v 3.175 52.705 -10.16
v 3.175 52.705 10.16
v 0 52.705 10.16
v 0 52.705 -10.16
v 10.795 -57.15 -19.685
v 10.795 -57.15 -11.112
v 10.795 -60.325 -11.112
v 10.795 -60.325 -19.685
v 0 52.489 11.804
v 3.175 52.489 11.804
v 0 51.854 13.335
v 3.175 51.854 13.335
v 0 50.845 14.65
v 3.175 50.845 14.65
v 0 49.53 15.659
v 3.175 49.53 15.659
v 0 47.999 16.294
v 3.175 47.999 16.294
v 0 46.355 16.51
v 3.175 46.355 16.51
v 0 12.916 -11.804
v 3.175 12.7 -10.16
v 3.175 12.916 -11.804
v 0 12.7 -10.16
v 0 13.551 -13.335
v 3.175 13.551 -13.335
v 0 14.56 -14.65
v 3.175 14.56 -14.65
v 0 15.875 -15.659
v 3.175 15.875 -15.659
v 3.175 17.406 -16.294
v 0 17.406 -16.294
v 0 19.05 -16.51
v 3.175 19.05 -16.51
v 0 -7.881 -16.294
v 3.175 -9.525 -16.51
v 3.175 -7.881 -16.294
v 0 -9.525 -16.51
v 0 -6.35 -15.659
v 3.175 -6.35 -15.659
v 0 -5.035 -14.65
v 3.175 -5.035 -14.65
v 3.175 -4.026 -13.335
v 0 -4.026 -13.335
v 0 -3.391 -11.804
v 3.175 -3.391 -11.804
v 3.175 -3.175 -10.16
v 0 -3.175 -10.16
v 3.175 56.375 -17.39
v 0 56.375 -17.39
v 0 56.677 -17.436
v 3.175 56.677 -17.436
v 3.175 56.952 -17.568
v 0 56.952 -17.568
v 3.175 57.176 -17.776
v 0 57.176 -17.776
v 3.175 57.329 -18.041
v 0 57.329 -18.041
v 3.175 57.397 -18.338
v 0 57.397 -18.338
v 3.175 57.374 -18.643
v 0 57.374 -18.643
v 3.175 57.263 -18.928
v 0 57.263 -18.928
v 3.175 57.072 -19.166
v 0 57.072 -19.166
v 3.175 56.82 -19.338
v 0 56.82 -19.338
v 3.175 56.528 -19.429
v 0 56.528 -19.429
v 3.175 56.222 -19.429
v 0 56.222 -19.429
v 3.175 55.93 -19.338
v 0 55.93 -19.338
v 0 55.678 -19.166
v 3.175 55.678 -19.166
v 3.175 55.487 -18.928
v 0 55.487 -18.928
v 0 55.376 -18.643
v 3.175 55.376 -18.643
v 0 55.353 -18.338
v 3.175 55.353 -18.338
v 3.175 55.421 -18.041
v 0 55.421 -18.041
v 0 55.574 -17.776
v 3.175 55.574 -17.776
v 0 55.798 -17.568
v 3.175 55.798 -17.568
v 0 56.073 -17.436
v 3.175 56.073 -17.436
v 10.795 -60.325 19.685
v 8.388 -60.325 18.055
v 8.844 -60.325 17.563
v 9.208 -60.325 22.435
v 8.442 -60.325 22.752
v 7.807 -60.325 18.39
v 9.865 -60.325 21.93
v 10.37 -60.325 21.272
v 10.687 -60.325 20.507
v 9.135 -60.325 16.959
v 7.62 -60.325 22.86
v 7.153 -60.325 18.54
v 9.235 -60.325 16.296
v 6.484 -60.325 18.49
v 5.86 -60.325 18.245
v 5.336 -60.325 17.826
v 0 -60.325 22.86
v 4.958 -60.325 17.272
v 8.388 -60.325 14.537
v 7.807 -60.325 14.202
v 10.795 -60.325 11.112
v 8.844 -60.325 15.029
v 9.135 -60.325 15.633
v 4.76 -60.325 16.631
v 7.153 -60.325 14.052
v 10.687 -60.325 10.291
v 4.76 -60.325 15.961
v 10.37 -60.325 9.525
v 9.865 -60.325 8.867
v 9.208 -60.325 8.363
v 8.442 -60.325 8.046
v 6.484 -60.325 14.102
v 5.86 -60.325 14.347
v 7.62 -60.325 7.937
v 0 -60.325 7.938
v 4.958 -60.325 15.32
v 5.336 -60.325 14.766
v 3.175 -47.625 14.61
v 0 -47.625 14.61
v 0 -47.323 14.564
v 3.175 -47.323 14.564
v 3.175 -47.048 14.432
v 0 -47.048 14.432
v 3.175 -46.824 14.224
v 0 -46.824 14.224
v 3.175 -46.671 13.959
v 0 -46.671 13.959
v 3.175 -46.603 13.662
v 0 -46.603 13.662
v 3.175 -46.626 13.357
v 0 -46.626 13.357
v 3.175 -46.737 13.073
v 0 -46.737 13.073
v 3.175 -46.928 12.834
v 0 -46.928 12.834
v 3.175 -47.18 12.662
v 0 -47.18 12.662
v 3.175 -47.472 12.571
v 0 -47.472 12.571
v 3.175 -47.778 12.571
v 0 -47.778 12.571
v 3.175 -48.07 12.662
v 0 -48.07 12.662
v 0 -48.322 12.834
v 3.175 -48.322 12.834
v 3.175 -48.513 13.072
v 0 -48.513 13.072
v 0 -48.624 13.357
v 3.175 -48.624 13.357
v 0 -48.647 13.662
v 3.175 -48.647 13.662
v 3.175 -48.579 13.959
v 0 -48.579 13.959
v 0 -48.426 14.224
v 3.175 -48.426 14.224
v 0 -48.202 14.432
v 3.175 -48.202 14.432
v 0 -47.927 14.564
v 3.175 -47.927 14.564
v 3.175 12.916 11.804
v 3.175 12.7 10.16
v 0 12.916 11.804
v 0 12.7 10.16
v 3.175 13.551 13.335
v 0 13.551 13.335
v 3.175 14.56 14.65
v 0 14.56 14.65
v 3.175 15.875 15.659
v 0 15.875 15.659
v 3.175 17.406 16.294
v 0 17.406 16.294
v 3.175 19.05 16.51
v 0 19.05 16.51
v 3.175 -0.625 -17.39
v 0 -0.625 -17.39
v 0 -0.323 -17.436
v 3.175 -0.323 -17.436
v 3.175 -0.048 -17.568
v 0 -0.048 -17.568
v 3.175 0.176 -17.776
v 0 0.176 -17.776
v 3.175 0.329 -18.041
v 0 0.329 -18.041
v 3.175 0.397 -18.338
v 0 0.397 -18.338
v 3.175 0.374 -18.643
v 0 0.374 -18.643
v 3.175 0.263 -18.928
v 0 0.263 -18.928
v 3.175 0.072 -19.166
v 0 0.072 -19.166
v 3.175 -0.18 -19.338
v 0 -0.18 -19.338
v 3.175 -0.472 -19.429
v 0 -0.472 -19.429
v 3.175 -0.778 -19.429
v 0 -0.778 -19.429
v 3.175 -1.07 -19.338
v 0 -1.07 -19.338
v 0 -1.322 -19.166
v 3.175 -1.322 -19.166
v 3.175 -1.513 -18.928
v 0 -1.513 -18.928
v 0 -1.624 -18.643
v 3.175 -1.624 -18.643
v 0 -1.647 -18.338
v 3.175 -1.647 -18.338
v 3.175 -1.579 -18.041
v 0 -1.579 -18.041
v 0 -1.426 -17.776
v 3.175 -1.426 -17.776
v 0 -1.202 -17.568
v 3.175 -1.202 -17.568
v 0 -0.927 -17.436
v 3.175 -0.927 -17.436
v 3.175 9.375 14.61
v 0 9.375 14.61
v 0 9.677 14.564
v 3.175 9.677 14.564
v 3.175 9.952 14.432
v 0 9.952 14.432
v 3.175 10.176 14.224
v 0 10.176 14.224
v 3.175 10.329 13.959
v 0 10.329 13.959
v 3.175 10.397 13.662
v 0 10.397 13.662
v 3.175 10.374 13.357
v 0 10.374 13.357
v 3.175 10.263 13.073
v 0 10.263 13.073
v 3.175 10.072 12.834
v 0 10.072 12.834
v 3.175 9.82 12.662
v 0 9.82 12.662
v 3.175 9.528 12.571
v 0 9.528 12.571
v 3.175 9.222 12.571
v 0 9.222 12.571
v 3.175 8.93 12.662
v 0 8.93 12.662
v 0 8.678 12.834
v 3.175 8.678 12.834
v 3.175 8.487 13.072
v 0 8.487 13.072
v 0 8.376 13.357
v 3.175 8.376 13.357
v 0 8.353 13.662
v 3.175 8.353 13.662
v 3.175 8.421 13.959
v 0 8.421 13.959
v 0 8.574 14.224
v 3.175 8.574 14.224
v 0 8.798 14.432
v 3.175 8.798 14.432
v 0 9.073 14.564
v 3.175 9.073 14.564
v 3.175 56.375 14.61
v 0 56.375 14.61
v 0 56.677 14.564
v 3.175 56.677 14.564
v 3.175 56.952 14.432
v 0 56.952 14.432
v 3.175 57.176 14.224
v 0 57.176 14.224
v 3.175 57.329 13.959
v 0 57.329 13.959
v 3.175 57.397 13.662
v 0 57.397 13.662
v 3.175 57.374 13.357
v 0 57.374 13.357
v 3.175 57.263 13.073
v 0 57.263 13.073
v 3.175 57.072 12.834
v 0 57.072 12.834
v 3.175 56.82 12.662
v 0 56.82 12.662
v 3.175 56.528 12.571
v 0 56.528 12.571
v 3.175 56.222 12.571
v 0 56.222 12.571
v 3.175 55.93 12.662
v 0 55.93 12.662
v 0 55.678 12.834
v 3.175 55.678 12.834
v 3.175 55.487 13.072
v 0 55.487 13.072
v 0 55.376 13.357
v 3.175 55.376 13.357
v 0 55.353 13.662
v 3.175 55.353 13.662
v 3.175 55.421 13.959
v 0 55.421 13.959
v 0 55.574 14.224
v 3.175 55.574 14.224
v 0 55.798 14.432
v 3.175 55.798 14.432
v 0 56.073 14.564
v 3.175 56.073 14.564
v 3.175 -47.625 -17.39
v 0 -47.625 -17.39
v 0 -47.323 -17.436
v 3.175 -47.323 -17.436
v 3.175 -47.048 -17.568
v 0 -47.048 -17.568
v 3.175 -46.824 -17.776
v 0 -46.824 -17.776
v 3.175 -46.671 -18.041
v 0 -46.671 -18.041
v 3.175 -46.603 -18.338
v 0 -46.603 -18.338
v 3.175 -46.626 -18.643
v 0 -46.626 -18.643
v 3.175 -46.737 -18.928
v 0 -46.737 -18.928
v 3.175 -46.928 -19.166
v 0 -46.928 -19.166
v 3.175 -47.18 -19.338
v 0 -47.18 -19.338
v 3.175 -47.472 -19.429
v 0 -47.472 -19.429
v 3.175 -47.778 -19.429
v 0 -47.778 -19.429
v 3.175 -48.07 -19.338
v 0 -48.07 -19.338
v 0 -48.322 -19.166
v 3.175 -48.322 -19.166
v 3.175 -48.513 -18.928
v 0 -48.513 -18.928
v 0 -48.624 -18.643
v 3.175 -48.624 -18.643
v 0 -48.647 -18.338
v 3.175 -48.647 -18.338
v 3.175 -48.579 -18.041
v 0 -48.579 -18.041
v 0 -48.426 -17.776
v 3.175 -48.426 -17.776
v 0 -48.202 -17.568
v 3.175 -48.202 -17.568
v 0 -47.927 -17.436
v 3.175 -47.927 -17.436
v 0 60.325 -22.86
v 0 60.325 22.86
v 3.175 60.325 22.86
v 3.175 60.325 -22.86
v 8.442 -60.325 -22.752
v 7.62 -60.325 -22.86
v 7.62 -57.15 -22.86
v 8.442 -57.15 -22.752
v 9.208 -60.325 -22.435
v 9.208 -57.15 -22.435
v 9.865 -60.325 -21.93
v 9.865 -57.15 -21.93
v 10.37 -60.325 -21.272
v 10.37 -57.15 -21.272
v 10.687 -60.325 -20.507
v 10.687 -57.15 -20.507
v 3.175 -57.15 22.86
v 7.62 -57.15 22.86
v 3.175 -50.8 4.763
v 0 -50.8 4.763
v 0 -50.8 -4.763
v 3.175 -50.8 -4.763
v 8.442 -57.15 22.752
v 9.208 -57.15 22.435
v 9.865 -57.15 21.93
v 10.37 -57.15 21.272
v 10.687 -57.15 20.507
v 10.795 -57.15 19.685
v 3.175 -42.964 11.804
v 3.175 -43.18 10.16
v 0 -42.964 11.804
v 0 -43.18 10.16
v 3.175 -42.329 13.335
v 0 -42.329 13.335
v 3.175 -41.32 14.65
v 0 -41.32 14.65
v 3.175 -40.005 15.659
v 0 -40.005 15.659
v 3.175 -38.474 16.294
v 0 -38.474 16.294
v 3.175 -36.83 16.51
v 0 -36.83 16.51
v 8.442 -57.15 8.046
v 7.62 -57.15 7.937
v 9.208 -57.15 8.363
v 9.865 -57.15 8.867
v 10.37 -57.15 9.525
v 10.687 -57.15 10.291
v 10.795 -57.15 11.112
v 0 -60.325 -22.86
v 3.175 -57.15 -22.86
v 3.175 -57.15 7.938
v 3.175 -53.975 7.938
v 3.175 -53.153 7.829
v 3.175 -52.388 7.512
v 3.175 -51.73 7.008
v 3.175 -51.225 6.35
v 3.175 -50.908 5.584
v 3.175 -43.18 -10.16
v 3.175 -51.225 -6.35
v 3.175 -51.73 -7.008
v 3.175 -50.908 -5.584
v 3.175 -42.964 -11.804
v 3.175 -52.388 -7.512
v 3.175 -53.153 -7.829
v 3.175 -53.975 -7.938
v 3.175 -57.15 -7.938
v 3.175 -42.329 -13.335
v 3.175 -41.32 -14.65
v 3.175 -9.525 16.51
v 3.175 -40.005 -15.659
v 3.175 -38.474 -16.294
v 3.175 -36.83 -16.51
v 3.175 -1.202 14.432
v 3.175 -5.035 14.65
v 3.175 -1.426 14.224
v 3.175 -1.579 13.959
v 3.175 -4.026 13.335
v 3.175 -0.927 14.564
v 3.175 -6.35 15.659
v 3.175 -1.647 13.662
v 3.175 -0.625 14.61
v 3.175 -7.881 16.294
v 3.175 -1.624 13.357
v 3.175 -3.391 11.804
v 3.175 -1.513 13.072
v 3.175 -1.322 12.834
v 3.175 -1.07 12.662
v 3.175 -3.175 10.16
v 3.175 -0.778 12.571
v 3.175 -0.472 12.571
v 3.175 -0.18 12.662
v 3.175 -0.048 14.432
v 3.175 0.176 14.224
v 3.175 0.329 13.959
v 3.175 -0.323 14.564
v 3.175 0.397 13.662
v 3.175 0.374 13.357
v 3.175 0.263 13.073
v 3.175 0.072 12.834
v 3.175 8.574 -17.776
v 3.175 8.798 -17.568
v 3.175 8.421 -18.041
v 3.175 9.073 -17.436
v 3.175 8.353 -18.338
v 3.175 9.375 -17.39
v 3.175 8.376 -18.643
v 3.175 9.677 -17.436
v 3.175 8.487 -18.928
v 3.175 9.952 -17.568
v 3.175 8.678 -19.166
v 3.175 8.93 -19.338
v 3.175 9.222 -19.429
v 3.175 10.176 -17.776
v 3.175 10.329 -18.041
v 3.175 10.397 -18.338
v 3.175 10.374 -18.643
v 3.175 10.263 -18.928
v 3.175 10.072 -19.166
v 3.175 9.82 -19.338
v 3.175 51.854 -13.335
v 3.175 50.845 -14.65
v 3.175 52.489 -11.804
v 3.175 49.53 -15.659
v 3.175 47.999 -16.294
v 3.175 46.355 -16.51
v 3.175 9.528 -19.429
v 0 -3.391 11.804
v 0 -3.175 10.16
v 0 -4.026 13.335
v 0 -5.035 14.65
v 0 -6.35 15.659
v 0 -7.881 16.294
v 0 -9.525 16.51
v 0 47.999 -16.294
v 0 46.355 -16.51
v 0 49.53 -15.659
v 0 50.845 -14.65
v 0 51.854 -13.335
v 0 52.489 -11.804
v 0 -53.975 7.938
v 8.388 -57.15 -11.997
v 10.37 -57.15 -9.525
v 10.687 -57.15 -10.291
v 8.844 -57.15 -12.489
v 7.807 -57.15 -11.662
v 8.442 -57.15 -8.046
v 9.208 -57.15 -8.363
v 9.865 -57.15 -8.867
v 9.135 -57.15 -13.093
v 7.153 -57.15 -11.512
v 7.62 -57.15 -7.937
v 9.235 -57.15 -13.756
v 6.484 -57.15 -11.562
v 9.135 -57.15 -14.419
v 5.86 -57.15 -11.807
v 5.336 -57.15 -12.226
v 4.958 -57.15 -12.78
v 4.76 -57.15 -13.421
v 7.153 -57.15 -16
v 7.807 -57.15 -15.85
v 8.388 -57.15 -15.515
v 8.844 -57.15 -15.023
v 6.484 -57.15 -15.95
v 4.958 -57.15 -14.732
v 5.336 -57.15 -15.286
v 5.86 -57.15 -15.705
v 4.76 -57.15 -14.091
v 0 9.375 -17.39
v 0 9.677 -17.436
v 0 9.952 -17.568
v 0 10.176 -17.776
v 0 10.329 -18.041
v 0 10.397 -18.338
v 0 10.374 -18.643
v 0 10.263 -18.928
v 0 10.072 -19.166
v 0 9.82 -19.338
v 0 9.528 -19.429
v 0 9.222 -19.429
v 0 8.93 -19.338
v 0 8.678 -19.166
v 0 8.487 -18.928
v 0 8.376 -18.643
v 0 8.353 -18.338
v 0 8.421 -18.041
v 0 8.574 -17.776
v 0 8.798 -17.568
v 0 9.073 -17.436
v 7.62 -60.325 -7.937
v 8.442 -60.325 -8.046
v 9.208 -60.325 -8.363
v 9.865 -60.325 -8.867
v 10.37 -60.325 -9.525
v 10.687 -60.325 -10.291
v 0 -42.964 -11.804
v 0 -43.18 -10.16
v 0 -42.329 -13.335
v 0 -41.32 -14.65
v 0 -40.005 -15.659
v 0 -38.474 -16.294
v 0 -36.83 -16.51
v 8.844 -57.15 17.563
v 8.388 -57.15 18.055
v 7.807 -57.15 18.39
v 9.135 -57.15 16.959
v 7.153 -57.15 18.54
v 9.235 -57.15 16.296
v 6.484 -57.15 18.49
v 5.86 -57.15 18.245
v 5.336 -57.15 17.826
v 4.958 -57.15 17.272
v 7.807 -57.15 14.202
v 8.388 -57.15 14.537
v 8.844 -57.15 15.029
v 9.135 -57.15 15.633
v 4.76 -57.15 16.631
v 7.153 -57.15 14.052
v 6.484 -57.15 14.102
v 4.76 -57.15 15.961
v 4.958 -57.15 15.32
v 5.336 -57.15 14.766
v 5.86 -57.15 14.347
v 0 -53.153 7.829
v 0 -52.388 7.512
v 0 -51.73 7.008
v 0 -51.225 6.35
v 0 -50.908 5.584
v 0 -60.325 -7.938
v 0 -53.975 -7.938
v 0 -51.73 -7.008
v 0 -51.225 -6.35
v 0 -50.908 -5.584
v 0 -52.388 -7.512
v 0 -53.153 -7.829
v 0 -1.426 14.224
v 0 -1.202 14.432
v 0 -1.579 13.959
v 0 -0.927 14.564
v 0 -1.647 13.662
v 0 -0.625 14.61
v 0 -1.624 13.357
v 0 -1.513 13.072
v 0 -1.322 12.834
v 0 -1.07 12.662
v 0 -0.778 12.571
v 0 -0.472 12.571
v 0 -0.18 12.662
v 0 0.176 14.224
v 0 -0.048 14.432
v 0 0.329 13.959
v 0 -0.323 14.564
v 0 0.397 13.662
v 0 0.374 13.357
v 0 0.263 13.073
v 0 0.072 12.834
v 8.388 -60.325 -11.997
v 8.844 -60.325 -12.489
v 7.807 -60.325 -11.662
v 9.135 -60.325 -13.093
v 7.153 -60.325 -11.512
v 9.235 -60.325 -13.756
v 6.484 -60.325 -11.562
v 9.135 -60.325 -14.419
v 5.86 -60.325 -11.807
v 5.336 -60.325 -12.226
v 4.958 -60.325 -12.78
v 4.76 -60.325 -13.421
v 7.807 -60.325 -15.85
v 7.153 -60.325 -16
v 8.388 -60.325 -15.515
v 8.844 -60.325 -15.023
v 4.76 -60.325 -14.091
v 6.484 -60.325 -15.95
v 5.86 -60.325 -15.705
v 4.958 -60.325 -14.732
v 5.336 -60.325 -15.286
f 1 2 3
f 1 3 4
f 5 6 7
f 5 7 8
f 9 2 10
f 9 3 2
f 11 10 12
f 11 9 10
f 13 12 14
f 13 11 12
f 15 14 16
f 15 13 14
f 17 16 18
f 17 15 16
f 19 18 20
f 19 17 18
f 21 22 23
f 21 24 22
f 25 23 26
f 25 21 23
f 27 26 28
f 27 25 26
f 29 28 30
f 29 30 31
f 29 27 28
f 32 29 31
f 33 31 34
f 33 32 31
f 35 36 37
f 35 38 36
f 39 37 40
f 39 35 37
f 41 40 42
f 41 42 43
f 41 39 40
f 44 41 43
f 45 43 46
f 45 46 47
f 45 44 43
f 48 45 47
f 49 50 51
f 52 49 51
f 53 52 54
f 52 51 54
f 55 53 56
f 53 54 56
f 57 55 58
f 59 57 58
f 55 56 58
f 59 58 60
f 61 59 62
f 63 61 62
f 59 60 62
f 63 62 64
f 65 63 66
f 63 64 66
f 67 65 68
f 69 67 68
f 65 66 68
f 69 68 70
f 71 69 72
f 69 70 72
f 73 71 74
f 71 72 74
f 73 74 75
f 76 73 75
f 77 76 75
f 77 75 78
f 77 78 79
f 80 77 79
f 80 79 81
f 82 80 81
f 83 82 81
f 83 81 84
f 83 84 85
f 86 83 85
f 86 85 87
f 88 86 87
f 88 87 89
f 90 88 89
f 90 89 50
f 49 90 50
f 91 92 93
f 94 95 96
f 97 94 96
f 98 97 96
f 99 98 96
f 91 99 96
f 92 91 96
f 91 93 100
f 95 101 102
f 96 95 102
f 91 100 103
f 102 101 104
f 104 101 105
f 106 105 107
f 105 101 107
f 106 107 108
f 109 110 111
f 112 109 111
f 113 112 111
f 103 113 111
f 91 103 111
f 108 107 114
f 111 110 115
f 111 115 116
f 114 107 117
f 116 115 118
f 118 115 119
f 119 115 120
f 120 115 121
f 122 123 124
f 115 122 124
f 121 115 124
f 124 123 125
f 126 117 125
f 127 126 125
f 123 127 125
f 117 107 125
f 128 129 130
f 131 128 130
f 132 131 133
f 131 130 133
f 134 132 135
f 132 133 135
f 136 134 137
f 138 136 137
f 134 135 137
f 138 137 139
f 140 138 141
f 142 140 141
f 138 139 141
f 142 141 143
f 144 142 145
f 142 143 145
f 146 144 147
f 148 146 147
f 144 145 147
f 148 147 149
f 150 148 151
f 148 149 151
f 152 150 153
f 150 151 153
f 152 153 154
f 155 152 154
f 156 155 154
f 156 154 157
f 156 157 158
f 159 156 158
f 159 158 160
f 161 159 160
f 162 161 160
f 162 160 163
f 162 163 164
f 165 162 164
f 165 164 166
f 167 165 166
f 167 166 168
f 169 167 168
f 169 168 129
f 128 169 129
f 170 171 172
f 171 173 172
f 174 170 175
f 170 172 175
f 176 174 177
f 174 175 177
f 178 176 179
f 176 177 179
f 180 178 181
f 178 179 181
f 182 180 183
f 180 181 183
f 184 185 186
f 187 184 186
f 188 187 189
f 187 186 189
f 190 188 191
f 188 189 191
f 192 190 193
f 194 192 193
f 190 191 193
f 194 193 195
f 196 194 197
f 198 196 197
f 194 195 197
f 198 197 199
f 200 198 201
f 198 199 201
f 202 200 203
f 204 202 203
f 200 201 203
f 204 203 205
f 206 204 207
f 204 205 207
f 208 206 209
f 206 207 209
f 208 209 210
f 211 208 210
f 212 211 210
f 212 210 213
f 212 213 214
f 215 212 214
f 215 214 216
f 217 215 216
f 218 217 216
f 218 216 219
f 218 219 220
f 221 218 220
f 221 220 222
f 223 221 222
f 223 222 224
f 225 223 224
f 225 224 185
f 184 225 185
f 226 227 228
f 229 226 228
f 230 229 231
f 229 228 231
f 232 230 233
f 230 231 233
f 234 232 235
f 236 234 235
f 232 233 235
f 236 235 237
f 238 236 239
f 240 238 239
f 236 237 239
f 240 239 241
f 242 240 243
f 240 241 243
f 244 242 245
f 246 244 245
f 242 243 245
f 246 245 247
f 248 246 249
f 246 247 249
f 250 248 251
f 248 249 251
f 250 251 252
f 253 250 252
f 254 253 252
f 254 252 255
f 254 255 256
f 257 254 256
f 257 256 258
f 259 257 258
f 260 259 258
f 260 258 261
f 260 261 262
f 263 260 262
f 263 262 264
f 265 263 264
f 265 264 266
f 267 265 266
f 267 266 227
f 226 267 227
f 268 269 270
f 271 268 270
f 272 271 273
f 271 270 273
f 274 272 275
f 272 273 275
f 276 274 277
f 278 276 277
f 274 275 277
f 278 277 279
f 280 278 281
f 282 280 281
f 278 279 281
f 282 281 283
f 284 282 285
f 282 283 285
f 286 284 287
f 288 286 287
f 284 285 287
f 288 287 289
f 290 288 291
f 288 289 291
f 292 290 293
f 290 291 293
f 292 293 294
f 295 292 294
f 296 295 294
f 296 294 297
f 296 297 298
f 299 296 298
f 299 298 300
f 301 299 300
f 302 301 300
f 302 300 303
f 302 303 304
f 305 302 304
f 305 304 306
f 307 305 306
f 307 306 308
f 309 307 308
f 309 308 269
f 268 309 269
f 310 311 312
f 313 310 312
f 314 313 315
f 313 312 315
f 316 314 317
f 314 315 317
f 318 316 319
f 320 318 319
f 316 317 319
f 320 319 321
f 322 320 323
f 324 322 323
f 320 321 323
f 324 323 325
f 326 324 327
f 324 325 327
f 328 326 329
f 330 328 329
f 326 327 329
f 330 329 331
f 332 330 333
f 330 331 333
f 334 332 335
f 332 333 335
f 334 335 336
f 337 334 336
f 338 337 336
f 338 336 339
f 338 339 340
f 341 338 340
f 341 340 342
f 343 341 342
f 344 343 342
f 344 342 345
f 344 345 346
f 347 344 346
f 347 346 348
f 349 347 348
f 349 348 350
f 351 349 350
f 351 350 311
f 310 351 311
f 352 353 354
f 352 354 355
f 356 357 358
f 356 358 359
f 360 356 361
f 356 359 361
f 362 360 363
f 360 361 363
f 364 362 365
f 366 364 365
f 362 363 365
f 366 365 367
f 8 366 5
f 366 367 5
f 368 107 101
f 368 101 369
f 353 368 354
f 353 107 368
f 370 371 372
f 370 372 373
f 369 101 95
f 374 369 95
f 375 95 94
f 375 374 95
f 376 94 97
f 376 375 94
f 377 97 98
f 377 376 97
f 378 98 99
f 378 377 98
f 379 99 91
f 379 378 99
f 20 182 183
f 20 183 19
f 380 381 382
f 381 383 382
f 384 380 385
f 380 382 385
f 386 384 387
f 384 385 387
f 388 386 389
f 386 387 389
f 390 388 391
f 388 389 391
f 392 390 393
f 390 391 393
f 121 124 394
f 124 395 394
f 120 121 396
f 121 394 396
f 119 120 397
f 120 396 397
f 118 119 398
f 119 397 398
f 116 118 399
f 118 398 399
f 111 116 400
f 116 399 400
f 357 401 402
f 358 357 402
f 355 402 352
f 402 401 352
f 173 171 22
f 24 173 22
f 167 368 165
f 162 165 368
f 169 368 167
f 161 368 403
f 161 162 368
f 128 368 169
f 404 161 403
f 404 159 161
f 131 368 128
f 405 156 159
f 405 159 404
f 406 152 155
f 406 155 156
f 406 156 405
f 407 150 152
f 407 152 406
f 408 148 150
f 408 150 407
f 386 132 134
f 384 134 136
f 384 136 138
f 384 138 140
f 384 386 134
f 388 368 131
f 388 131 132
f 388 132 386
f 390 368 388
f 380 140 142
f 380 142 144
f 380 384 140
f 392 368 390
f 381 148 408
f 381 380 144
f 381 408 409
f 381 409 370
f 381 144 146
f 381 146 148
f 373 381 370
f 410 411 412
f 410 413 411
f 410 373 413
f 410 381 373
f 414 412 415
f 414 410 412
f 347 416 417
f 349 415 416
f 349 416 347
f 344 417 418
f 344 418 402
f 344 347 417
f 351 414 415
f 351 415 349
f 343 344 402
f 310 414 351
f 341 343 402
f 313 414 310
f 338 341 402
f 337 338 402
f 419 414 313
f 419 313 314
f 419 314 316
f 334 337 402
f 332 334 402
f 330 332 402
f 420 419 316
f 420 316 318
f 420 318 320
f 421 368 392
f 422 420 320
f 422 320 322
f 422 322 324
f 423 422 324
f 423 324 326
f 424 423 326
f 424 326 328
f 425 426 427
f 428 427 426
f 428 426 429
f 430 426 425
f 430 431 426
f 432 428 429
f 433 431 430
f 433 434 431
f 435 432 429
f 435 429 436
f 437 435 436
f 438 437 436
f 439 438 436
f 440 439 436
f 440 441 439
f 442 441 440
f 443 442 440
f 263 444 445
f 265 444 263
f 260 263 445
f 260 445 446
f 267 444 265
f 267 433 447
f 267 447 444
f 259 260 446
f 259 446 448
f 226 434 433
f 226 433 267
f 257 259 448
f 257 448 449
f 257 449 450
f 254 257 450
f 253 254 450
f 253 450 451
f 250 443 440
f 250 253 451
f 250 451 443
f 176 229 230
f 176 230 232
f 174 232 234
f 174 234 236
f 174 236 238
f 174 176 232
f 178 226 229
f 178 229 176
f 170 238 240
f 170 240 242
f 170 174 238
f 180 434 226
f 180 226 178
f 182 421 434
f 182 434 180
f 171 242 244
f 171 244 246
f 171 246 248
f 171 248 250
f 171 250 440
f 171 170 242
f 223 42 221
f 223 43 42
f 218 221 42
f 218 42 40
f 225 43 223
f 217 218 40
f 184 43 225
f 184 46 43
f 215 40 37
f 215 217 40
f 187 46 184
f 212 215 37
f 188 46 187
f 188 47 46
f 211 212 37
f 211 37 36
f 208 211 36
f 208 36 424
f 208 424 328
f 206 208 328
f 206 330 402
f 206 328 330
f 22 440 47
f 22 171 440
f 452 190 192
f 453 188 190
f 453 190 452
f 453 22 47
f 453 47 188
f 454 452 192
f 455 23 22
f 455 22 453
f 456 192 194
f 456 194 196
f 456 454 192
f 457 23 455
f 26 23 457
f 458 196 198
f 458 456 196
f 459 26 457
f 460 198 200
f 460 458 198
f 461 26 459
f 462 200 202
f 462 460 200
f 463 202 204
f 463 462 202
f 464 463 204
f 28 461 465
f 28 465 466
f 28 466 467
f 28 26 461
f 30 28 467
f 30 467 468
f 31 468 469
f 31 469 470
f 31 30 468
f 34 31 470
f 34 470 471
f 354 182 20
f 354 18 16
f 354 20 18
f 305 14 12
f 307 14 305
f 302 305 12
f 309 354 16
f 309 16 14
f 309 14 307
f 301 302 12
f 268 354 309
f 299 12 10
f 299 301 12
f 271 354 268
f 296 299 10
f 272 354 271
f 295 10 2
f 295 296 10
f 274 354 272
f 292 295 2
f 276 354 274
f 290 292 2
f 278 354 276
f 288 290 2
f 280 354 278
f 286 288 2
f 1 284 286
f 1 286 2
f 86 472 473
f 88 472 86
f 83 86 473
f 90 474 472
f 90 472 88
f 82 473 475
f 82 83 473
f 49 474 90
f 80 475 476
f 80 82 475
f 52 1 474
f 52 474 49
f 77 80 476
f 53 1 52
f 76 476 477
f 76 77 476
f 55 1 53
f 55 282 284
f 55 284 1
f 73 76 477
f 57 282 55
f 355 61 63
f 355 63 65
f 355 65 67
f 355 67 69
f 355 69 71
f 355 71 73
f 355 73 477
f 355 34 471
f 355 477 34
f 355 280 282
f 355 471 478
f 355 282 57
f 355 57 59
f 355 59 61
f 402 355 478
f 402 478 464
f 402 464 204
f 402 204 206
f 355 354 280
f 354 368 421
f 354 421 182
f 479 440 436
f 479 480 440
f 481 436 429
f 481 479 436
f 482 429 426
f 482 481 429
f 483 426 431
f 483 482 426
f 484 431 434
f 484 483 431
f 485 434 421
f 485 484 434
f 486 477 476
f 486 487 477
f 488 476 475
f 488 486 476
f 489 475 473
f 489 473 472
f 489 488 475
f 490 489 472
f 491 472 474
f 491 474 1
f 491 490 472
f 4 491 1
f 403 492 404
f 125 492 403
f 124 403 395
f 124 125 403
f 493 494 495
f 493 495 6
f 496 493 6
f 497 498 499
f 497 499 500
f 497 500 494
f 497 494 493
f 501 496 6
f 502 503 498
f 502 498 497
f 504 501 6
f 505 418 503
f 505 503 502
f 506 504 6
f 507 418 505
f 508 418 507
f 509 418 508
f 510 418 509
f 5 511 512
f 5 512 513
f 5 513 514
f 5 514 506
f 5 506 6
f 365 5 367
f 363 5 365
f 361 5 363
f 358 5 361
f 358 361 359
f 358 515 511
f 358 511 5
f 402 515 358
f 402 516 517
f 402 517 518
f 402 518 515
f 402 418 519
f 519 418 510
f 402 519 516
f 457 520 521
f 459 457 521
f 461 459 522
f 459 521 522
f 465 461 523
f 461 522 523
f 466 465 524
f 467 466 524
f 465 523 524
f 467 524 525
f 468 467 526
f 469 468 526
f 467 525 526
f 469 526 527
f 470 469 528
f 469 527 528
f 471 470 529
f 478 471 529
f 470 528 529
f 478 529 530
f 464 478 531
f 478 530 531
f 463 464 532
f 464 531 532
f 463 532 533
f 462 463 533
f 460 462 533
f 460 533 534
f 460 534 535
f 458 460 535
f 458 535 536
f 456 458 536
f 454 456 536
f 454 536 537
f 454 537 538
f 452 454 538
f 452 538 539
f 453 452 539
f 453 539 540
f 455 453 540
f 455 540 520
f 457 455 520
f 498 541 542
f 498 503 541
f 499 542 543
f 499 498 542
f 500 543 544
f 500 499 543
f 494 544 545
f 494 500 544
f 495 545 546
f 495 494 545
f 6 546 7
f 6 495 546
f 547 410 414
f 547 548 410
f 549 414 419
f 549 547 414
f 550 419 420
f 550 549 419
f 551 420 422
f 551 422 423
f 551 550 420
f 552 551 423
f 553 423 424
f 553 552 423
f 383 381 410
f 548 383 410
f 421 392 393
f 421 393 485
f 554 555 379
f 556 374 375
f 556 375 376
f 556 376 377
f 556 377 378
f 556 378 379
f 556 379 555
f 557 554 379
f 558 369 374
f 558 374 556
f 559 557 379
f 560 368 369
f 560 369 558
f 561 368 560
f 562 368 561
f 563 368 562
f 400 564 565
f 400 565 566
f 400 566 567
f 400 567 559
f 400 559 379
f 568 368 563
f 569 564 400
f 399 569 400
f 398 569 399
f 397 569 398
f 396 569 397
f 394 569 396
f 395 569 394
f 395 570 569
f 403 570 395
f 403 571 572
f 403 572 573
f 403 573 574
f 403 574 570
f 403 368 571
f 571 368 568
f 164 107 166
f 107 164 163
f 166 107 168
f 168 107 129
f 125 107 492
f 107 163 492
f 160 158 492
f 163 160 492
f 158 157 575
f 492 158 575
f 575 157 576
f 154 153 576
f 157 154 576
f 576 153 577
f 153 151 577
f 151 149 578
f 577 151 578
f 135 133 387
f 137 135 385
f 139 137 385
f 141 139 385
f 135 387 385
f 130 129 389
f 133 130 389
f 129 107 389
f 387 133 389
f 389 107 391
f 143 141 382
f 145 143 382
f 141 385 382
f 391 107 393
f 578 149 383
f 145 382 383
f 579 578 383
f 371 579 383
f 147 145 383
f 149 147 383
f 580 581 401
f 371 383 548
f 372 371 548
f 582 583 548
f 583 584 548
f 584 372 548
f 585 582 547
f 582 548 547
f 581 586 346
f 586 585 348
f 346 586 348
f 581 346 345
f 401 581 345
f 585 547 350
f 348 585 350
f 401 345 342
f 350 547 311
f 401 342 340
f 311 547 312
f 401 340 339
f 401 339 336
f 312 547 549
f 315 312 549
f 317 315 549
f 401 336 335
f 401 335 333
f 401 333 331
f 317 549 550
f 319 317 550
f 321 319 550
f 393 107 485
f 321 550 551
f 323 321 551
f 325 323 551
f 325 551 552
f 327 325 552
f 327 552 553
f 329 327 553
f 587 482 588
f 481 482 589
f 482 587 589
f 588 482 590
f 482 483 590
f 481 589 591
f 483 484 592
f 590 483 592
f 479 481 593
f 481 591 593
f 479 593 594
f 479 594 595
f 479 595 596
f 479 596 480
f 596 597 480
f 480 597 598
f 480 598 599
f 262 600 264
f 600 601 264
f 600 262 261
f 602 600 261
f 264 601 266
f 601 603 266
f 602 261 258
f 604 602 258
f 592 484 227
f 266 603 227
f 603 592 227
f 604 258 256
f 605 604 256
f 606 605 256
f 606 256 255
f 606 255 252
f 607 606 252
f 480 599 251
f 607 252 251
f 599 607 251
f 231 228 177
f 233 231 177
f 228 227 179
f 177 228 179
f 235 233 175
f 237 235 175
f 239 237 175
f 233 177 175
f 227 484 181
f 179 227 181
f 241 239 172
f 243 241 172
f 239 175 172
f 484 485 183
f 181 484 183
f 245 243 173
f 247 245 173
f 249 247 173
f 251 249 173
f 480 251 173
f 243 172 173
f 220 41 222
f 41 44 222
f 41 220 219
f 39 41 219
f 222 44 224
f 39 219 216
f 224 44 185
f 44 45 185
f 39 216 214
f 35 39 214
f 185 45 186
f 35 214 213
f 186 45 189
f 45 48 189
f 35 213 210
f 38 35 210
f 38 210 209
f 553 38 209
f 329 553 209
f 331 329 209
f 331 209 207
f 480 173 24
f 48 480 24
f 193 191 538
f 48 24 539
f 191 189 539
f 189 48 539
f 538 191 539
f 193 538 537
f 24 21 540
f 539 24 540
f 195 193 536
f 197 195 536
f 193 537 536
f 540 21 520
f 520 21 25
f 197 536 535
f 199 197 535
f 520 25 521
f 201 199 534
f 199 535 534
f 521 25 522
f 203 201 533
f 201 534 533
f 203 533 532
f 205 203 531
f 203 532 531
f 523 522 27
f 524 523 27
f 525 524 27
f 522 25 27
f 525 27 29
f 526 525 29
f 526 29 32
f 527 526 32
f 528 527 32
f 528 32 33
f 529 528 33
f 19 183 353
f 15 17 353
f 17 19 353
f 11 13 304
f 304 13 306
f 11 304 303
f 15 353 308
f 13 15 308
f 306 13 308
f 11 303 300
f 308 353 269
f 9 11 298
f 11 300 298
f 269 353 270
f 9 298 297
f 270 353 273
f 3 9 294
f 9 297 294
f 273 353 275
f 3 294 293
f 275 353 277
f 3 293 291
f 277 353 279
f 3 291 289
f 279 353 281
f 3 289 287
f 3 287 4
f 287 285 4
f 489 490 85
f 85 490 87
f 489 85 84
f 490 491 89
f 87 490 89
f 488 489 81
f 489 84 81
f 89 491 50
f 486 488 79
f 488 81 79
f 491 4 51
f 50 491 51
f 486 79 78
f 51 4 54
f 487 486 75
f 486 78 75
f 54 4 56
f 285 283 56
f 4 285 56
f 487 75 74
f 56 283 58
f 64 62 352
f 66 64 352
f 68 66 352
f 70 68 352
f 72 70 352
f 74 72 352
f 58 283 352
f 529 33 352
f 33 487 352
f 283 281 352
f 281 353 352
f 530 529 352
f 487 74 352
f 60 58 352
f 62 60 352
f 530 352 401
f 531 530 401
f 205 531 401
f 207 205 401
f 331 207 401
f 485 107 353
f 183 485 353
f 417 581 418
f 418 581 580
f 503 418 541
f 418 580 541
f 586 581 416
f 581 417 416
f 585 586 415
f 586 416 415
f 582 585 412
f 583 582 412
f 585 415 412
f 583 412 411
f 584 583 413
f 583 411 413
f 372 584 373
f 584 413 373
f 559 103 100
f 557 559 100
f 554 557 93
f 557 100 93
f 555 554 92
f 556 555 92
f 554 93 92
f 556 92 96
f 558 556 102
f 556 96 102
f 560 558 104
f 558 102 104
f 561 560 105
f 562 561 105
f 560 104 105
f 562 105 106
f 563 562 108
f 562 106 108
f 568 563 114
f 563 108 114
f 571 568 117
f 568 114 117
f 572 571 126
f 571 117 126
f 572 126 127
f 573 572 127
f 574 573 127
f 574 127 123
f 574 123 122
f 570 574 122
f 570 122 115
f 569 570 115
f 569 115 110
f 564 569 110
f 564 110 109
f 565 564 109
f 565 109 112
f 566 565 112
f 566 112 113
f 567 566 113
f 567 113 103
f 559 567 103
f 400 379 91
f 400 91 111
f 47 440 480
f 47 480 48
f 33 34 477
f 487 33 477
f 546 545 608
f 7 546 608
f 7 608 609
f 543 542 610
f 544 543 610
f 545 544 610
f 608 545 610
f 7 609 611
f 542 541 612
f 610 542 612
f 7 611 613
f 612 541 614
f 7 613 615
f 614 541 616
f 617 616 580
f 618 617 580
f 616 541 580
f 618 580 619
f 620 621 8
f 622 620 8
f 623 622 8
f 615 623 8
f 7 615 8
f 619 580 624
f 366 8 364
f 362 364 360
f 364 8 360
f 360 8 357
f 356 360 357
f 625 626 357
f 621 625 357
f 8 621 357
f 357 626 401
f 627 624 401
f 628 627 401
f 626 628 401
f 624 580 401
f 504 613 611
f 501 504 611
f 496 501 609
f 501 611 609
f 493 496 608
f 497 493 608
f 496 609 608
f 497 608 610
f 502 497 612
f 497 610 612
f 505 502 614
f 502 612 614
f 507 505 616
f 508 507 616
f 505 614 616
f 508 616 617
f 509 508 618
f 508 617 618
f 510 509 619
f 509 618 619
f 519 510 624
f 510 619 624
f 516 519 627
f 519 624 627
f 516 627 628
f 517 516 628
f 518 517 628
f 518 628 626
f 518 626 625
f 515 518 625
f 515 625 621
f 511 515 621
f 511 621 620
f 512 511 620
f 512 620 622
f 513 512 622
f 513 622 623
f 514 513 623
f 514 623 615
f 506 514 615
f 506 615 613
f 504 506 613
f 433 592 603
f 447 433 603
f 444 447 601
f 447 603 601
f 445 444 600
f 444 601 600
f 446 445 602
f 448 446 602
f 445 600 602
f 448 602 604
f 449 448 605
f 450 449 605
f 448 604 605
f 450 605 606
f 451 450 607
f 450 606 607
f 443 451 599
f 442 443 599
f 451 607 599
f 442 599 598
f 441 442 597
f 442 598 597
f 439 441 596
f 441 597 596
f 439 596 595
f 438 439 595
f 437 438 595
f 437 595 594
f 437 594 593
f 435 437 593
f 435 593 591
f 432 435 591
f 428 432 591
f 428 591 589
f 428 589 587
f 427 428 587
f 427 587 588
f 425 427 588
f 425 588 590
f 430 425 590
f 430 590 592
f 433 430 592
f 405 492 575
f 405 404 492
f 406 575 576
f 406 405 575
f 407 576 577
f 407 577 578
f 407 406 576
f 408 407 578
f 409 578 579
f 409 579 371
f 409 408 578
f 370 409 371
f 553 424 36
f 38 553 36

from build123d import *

# Parameters (mm, degrees)
SKETCH1_W                    = 45.72
SKETCH1_H                    = 120.65
BOSS_EXTRUDE1_DEPTH          = 3.175
SKETCH2_W                    = 45.72
SKETCH2_H                    = 3.175
BOSS_EXTRUDE2_DEPTH          = 7.62
SKETCH3_W                    = 10.795
SKETCH3_H                    = 15.875
CUT_EXTRUDE1_DEPTH           = 9.525
M4_CLEARANCE_HOLE1_D         = 4.5
FILLET1_R                    = 3.175
FILLET2_R                    = 3.175
M2_5X0_45_TAPPED_HOLE1_D     = 2.05
M2_5X0_45_TAPPED_HOLE1_DEPTH = 6.35
M2_5X0_45_TAPPED_HOLE1_TIP   = 0.615882135
SKETCH10_W                   = 33.02
SKETCH10_H                   = 40.005
CUT_EXTRUDE2_DEPTH           = 65.959599945
FILLET3_R                    = 6.35


with BuildPart() as part:
    # Sketch1 → Boss-Extrude1 (new body)
    with BuildSketch(Plane(origin=(0, 0, 0), x_dir=(0, 0, -1), z_dir=(1, 0, 0))):
        Rectangle(SKETCH1_W, SKETCH1_H)
    extrude(amount=BOSS_EXTRUDE1_DEPTH)

    # Sketch2 → Boss-Extrude2 (add)
    with BuildSketch(Plane(origin=(3.175, 0, 0), x_dir=(0, 0, -1), z_dir=(1, 0, 0))):
        with Locations((0, -58.7375)):
            Rectangle(SKETCH2_W, SKETCH2_H)
    extrude(amount=BOSS_EXTRUDE2_DEPTH)

    # Sketch3 → Cut-Extrude1 (cut)
    with BuildSketch(Plane.XZ.offset(60.325)):
        with Locations((5.3975, 0)):
            Rectangle(SKETCH3_W, SKETCH3_H)
    extrude(amount=-CUT_EXTRUDE1_DEPTH, mode=Mode.SUBTRACT)

    # M4 Clearance Hole1 (through all)
    with Locations(Plane(origin=(0, -57.15, 0), x_dir=(-1, 0, 0), z_dir=(0, 1, 0))):
        with Locations((-6.985, -13.7560191), (-6.985, 16.2960191)):
            Hole(M4_CLEARANCE_HOLE1_D / 2)

    # Fillet1
    fillet1_edges = [part.edges().sort_by_distance(p)[0] for p in [
        (1.5875, -50.8, -7.9375),
        (1.5875, -50.8, 7.9375),
    ]]
    fillet(fillet1_edges, radius=FILLET1_R)

    # Fillet2
    fillet2_edges = [part.edges().sort_by_distance(p)[0] for p in [
        (10.795, -58.7375, -22.86),
        (10.795, -58.7375, -7.9375),
        (10.795, -58.7375, 22.86),
        (10.795, -58.7375, 7.9375),
    ]]
    fillet(fillet2_edges, radius=FILLET2_R)

    # M2.5x0.45 Tapped Hole1
    with Locations(Plane(origin=(3.175, 0, 0), x_dir=(0, 0, -1), z_dir=(1, 0, 0))):
        with Locations((-13.585, -47.625), (18.415, -47.625), (18.415, -0.625), (-13.585, -0.625), (-13.585, 9.375), (18.415, 9.375), (18.415, 56.375), (-13.585, 56.375)):
            Hole(M2_5X0_45_TAPPED_HOLE1_D / 2, depth=M2_5X0_45_TAPPED_HOLE1_DEPTH)
            with Locations((0, 0, -(M2_5X0_45_TAPPED_HOLE1_DEPTH + M2_5X0_45_TAPPED_HOLE1_TIP / 2))):  # 118° drill point
                Cone(0, M2_5X0_45_TAPPED_HOLE1_D / 2, M2_5X0_45_TAPPED_HOLE1_TIP, mode=Mode.SUBTRACT)

    # Sketch10 → Cut-Extrude2 (cut, through all)
    with BuildSketch(Plane(origin=(3.175, 0, 0), x_dir=(0, 0, -1), z_dir=(1, 0, 0))):
        with Locations((0, 32.7025)):
            Rectangle(SKETCH10_W, SKETCH10_H)
        with Locations((0, -23.1775)):
            Rectangle(SKETCH10_W, SKETCH10_H)
    extrude(amount=-CUT_EXTRUDE2_DEPTH, mode=Mode.SUBTRACT)

    # Fillet3
    fillet3_edges = [part.edges().sort_by_distance(p)[0] for p in [
        (1.5875, 52.705, -16.51),
        (1.5875, 12.7, -16.51),
        (1.5875, 12.7, 16.51),
        (1.5875, 52.705, 16.51),
        (1.5875, -3.175, -16.51),
        (1.5875, -43.18, -16.51),
        (1.5875, -43.18, 16.51),
        (1.5875, -3.175, 16.51),
    ]]
    fillet(fillet3_edges, radius=FILLET3_R)


solid = part.part
